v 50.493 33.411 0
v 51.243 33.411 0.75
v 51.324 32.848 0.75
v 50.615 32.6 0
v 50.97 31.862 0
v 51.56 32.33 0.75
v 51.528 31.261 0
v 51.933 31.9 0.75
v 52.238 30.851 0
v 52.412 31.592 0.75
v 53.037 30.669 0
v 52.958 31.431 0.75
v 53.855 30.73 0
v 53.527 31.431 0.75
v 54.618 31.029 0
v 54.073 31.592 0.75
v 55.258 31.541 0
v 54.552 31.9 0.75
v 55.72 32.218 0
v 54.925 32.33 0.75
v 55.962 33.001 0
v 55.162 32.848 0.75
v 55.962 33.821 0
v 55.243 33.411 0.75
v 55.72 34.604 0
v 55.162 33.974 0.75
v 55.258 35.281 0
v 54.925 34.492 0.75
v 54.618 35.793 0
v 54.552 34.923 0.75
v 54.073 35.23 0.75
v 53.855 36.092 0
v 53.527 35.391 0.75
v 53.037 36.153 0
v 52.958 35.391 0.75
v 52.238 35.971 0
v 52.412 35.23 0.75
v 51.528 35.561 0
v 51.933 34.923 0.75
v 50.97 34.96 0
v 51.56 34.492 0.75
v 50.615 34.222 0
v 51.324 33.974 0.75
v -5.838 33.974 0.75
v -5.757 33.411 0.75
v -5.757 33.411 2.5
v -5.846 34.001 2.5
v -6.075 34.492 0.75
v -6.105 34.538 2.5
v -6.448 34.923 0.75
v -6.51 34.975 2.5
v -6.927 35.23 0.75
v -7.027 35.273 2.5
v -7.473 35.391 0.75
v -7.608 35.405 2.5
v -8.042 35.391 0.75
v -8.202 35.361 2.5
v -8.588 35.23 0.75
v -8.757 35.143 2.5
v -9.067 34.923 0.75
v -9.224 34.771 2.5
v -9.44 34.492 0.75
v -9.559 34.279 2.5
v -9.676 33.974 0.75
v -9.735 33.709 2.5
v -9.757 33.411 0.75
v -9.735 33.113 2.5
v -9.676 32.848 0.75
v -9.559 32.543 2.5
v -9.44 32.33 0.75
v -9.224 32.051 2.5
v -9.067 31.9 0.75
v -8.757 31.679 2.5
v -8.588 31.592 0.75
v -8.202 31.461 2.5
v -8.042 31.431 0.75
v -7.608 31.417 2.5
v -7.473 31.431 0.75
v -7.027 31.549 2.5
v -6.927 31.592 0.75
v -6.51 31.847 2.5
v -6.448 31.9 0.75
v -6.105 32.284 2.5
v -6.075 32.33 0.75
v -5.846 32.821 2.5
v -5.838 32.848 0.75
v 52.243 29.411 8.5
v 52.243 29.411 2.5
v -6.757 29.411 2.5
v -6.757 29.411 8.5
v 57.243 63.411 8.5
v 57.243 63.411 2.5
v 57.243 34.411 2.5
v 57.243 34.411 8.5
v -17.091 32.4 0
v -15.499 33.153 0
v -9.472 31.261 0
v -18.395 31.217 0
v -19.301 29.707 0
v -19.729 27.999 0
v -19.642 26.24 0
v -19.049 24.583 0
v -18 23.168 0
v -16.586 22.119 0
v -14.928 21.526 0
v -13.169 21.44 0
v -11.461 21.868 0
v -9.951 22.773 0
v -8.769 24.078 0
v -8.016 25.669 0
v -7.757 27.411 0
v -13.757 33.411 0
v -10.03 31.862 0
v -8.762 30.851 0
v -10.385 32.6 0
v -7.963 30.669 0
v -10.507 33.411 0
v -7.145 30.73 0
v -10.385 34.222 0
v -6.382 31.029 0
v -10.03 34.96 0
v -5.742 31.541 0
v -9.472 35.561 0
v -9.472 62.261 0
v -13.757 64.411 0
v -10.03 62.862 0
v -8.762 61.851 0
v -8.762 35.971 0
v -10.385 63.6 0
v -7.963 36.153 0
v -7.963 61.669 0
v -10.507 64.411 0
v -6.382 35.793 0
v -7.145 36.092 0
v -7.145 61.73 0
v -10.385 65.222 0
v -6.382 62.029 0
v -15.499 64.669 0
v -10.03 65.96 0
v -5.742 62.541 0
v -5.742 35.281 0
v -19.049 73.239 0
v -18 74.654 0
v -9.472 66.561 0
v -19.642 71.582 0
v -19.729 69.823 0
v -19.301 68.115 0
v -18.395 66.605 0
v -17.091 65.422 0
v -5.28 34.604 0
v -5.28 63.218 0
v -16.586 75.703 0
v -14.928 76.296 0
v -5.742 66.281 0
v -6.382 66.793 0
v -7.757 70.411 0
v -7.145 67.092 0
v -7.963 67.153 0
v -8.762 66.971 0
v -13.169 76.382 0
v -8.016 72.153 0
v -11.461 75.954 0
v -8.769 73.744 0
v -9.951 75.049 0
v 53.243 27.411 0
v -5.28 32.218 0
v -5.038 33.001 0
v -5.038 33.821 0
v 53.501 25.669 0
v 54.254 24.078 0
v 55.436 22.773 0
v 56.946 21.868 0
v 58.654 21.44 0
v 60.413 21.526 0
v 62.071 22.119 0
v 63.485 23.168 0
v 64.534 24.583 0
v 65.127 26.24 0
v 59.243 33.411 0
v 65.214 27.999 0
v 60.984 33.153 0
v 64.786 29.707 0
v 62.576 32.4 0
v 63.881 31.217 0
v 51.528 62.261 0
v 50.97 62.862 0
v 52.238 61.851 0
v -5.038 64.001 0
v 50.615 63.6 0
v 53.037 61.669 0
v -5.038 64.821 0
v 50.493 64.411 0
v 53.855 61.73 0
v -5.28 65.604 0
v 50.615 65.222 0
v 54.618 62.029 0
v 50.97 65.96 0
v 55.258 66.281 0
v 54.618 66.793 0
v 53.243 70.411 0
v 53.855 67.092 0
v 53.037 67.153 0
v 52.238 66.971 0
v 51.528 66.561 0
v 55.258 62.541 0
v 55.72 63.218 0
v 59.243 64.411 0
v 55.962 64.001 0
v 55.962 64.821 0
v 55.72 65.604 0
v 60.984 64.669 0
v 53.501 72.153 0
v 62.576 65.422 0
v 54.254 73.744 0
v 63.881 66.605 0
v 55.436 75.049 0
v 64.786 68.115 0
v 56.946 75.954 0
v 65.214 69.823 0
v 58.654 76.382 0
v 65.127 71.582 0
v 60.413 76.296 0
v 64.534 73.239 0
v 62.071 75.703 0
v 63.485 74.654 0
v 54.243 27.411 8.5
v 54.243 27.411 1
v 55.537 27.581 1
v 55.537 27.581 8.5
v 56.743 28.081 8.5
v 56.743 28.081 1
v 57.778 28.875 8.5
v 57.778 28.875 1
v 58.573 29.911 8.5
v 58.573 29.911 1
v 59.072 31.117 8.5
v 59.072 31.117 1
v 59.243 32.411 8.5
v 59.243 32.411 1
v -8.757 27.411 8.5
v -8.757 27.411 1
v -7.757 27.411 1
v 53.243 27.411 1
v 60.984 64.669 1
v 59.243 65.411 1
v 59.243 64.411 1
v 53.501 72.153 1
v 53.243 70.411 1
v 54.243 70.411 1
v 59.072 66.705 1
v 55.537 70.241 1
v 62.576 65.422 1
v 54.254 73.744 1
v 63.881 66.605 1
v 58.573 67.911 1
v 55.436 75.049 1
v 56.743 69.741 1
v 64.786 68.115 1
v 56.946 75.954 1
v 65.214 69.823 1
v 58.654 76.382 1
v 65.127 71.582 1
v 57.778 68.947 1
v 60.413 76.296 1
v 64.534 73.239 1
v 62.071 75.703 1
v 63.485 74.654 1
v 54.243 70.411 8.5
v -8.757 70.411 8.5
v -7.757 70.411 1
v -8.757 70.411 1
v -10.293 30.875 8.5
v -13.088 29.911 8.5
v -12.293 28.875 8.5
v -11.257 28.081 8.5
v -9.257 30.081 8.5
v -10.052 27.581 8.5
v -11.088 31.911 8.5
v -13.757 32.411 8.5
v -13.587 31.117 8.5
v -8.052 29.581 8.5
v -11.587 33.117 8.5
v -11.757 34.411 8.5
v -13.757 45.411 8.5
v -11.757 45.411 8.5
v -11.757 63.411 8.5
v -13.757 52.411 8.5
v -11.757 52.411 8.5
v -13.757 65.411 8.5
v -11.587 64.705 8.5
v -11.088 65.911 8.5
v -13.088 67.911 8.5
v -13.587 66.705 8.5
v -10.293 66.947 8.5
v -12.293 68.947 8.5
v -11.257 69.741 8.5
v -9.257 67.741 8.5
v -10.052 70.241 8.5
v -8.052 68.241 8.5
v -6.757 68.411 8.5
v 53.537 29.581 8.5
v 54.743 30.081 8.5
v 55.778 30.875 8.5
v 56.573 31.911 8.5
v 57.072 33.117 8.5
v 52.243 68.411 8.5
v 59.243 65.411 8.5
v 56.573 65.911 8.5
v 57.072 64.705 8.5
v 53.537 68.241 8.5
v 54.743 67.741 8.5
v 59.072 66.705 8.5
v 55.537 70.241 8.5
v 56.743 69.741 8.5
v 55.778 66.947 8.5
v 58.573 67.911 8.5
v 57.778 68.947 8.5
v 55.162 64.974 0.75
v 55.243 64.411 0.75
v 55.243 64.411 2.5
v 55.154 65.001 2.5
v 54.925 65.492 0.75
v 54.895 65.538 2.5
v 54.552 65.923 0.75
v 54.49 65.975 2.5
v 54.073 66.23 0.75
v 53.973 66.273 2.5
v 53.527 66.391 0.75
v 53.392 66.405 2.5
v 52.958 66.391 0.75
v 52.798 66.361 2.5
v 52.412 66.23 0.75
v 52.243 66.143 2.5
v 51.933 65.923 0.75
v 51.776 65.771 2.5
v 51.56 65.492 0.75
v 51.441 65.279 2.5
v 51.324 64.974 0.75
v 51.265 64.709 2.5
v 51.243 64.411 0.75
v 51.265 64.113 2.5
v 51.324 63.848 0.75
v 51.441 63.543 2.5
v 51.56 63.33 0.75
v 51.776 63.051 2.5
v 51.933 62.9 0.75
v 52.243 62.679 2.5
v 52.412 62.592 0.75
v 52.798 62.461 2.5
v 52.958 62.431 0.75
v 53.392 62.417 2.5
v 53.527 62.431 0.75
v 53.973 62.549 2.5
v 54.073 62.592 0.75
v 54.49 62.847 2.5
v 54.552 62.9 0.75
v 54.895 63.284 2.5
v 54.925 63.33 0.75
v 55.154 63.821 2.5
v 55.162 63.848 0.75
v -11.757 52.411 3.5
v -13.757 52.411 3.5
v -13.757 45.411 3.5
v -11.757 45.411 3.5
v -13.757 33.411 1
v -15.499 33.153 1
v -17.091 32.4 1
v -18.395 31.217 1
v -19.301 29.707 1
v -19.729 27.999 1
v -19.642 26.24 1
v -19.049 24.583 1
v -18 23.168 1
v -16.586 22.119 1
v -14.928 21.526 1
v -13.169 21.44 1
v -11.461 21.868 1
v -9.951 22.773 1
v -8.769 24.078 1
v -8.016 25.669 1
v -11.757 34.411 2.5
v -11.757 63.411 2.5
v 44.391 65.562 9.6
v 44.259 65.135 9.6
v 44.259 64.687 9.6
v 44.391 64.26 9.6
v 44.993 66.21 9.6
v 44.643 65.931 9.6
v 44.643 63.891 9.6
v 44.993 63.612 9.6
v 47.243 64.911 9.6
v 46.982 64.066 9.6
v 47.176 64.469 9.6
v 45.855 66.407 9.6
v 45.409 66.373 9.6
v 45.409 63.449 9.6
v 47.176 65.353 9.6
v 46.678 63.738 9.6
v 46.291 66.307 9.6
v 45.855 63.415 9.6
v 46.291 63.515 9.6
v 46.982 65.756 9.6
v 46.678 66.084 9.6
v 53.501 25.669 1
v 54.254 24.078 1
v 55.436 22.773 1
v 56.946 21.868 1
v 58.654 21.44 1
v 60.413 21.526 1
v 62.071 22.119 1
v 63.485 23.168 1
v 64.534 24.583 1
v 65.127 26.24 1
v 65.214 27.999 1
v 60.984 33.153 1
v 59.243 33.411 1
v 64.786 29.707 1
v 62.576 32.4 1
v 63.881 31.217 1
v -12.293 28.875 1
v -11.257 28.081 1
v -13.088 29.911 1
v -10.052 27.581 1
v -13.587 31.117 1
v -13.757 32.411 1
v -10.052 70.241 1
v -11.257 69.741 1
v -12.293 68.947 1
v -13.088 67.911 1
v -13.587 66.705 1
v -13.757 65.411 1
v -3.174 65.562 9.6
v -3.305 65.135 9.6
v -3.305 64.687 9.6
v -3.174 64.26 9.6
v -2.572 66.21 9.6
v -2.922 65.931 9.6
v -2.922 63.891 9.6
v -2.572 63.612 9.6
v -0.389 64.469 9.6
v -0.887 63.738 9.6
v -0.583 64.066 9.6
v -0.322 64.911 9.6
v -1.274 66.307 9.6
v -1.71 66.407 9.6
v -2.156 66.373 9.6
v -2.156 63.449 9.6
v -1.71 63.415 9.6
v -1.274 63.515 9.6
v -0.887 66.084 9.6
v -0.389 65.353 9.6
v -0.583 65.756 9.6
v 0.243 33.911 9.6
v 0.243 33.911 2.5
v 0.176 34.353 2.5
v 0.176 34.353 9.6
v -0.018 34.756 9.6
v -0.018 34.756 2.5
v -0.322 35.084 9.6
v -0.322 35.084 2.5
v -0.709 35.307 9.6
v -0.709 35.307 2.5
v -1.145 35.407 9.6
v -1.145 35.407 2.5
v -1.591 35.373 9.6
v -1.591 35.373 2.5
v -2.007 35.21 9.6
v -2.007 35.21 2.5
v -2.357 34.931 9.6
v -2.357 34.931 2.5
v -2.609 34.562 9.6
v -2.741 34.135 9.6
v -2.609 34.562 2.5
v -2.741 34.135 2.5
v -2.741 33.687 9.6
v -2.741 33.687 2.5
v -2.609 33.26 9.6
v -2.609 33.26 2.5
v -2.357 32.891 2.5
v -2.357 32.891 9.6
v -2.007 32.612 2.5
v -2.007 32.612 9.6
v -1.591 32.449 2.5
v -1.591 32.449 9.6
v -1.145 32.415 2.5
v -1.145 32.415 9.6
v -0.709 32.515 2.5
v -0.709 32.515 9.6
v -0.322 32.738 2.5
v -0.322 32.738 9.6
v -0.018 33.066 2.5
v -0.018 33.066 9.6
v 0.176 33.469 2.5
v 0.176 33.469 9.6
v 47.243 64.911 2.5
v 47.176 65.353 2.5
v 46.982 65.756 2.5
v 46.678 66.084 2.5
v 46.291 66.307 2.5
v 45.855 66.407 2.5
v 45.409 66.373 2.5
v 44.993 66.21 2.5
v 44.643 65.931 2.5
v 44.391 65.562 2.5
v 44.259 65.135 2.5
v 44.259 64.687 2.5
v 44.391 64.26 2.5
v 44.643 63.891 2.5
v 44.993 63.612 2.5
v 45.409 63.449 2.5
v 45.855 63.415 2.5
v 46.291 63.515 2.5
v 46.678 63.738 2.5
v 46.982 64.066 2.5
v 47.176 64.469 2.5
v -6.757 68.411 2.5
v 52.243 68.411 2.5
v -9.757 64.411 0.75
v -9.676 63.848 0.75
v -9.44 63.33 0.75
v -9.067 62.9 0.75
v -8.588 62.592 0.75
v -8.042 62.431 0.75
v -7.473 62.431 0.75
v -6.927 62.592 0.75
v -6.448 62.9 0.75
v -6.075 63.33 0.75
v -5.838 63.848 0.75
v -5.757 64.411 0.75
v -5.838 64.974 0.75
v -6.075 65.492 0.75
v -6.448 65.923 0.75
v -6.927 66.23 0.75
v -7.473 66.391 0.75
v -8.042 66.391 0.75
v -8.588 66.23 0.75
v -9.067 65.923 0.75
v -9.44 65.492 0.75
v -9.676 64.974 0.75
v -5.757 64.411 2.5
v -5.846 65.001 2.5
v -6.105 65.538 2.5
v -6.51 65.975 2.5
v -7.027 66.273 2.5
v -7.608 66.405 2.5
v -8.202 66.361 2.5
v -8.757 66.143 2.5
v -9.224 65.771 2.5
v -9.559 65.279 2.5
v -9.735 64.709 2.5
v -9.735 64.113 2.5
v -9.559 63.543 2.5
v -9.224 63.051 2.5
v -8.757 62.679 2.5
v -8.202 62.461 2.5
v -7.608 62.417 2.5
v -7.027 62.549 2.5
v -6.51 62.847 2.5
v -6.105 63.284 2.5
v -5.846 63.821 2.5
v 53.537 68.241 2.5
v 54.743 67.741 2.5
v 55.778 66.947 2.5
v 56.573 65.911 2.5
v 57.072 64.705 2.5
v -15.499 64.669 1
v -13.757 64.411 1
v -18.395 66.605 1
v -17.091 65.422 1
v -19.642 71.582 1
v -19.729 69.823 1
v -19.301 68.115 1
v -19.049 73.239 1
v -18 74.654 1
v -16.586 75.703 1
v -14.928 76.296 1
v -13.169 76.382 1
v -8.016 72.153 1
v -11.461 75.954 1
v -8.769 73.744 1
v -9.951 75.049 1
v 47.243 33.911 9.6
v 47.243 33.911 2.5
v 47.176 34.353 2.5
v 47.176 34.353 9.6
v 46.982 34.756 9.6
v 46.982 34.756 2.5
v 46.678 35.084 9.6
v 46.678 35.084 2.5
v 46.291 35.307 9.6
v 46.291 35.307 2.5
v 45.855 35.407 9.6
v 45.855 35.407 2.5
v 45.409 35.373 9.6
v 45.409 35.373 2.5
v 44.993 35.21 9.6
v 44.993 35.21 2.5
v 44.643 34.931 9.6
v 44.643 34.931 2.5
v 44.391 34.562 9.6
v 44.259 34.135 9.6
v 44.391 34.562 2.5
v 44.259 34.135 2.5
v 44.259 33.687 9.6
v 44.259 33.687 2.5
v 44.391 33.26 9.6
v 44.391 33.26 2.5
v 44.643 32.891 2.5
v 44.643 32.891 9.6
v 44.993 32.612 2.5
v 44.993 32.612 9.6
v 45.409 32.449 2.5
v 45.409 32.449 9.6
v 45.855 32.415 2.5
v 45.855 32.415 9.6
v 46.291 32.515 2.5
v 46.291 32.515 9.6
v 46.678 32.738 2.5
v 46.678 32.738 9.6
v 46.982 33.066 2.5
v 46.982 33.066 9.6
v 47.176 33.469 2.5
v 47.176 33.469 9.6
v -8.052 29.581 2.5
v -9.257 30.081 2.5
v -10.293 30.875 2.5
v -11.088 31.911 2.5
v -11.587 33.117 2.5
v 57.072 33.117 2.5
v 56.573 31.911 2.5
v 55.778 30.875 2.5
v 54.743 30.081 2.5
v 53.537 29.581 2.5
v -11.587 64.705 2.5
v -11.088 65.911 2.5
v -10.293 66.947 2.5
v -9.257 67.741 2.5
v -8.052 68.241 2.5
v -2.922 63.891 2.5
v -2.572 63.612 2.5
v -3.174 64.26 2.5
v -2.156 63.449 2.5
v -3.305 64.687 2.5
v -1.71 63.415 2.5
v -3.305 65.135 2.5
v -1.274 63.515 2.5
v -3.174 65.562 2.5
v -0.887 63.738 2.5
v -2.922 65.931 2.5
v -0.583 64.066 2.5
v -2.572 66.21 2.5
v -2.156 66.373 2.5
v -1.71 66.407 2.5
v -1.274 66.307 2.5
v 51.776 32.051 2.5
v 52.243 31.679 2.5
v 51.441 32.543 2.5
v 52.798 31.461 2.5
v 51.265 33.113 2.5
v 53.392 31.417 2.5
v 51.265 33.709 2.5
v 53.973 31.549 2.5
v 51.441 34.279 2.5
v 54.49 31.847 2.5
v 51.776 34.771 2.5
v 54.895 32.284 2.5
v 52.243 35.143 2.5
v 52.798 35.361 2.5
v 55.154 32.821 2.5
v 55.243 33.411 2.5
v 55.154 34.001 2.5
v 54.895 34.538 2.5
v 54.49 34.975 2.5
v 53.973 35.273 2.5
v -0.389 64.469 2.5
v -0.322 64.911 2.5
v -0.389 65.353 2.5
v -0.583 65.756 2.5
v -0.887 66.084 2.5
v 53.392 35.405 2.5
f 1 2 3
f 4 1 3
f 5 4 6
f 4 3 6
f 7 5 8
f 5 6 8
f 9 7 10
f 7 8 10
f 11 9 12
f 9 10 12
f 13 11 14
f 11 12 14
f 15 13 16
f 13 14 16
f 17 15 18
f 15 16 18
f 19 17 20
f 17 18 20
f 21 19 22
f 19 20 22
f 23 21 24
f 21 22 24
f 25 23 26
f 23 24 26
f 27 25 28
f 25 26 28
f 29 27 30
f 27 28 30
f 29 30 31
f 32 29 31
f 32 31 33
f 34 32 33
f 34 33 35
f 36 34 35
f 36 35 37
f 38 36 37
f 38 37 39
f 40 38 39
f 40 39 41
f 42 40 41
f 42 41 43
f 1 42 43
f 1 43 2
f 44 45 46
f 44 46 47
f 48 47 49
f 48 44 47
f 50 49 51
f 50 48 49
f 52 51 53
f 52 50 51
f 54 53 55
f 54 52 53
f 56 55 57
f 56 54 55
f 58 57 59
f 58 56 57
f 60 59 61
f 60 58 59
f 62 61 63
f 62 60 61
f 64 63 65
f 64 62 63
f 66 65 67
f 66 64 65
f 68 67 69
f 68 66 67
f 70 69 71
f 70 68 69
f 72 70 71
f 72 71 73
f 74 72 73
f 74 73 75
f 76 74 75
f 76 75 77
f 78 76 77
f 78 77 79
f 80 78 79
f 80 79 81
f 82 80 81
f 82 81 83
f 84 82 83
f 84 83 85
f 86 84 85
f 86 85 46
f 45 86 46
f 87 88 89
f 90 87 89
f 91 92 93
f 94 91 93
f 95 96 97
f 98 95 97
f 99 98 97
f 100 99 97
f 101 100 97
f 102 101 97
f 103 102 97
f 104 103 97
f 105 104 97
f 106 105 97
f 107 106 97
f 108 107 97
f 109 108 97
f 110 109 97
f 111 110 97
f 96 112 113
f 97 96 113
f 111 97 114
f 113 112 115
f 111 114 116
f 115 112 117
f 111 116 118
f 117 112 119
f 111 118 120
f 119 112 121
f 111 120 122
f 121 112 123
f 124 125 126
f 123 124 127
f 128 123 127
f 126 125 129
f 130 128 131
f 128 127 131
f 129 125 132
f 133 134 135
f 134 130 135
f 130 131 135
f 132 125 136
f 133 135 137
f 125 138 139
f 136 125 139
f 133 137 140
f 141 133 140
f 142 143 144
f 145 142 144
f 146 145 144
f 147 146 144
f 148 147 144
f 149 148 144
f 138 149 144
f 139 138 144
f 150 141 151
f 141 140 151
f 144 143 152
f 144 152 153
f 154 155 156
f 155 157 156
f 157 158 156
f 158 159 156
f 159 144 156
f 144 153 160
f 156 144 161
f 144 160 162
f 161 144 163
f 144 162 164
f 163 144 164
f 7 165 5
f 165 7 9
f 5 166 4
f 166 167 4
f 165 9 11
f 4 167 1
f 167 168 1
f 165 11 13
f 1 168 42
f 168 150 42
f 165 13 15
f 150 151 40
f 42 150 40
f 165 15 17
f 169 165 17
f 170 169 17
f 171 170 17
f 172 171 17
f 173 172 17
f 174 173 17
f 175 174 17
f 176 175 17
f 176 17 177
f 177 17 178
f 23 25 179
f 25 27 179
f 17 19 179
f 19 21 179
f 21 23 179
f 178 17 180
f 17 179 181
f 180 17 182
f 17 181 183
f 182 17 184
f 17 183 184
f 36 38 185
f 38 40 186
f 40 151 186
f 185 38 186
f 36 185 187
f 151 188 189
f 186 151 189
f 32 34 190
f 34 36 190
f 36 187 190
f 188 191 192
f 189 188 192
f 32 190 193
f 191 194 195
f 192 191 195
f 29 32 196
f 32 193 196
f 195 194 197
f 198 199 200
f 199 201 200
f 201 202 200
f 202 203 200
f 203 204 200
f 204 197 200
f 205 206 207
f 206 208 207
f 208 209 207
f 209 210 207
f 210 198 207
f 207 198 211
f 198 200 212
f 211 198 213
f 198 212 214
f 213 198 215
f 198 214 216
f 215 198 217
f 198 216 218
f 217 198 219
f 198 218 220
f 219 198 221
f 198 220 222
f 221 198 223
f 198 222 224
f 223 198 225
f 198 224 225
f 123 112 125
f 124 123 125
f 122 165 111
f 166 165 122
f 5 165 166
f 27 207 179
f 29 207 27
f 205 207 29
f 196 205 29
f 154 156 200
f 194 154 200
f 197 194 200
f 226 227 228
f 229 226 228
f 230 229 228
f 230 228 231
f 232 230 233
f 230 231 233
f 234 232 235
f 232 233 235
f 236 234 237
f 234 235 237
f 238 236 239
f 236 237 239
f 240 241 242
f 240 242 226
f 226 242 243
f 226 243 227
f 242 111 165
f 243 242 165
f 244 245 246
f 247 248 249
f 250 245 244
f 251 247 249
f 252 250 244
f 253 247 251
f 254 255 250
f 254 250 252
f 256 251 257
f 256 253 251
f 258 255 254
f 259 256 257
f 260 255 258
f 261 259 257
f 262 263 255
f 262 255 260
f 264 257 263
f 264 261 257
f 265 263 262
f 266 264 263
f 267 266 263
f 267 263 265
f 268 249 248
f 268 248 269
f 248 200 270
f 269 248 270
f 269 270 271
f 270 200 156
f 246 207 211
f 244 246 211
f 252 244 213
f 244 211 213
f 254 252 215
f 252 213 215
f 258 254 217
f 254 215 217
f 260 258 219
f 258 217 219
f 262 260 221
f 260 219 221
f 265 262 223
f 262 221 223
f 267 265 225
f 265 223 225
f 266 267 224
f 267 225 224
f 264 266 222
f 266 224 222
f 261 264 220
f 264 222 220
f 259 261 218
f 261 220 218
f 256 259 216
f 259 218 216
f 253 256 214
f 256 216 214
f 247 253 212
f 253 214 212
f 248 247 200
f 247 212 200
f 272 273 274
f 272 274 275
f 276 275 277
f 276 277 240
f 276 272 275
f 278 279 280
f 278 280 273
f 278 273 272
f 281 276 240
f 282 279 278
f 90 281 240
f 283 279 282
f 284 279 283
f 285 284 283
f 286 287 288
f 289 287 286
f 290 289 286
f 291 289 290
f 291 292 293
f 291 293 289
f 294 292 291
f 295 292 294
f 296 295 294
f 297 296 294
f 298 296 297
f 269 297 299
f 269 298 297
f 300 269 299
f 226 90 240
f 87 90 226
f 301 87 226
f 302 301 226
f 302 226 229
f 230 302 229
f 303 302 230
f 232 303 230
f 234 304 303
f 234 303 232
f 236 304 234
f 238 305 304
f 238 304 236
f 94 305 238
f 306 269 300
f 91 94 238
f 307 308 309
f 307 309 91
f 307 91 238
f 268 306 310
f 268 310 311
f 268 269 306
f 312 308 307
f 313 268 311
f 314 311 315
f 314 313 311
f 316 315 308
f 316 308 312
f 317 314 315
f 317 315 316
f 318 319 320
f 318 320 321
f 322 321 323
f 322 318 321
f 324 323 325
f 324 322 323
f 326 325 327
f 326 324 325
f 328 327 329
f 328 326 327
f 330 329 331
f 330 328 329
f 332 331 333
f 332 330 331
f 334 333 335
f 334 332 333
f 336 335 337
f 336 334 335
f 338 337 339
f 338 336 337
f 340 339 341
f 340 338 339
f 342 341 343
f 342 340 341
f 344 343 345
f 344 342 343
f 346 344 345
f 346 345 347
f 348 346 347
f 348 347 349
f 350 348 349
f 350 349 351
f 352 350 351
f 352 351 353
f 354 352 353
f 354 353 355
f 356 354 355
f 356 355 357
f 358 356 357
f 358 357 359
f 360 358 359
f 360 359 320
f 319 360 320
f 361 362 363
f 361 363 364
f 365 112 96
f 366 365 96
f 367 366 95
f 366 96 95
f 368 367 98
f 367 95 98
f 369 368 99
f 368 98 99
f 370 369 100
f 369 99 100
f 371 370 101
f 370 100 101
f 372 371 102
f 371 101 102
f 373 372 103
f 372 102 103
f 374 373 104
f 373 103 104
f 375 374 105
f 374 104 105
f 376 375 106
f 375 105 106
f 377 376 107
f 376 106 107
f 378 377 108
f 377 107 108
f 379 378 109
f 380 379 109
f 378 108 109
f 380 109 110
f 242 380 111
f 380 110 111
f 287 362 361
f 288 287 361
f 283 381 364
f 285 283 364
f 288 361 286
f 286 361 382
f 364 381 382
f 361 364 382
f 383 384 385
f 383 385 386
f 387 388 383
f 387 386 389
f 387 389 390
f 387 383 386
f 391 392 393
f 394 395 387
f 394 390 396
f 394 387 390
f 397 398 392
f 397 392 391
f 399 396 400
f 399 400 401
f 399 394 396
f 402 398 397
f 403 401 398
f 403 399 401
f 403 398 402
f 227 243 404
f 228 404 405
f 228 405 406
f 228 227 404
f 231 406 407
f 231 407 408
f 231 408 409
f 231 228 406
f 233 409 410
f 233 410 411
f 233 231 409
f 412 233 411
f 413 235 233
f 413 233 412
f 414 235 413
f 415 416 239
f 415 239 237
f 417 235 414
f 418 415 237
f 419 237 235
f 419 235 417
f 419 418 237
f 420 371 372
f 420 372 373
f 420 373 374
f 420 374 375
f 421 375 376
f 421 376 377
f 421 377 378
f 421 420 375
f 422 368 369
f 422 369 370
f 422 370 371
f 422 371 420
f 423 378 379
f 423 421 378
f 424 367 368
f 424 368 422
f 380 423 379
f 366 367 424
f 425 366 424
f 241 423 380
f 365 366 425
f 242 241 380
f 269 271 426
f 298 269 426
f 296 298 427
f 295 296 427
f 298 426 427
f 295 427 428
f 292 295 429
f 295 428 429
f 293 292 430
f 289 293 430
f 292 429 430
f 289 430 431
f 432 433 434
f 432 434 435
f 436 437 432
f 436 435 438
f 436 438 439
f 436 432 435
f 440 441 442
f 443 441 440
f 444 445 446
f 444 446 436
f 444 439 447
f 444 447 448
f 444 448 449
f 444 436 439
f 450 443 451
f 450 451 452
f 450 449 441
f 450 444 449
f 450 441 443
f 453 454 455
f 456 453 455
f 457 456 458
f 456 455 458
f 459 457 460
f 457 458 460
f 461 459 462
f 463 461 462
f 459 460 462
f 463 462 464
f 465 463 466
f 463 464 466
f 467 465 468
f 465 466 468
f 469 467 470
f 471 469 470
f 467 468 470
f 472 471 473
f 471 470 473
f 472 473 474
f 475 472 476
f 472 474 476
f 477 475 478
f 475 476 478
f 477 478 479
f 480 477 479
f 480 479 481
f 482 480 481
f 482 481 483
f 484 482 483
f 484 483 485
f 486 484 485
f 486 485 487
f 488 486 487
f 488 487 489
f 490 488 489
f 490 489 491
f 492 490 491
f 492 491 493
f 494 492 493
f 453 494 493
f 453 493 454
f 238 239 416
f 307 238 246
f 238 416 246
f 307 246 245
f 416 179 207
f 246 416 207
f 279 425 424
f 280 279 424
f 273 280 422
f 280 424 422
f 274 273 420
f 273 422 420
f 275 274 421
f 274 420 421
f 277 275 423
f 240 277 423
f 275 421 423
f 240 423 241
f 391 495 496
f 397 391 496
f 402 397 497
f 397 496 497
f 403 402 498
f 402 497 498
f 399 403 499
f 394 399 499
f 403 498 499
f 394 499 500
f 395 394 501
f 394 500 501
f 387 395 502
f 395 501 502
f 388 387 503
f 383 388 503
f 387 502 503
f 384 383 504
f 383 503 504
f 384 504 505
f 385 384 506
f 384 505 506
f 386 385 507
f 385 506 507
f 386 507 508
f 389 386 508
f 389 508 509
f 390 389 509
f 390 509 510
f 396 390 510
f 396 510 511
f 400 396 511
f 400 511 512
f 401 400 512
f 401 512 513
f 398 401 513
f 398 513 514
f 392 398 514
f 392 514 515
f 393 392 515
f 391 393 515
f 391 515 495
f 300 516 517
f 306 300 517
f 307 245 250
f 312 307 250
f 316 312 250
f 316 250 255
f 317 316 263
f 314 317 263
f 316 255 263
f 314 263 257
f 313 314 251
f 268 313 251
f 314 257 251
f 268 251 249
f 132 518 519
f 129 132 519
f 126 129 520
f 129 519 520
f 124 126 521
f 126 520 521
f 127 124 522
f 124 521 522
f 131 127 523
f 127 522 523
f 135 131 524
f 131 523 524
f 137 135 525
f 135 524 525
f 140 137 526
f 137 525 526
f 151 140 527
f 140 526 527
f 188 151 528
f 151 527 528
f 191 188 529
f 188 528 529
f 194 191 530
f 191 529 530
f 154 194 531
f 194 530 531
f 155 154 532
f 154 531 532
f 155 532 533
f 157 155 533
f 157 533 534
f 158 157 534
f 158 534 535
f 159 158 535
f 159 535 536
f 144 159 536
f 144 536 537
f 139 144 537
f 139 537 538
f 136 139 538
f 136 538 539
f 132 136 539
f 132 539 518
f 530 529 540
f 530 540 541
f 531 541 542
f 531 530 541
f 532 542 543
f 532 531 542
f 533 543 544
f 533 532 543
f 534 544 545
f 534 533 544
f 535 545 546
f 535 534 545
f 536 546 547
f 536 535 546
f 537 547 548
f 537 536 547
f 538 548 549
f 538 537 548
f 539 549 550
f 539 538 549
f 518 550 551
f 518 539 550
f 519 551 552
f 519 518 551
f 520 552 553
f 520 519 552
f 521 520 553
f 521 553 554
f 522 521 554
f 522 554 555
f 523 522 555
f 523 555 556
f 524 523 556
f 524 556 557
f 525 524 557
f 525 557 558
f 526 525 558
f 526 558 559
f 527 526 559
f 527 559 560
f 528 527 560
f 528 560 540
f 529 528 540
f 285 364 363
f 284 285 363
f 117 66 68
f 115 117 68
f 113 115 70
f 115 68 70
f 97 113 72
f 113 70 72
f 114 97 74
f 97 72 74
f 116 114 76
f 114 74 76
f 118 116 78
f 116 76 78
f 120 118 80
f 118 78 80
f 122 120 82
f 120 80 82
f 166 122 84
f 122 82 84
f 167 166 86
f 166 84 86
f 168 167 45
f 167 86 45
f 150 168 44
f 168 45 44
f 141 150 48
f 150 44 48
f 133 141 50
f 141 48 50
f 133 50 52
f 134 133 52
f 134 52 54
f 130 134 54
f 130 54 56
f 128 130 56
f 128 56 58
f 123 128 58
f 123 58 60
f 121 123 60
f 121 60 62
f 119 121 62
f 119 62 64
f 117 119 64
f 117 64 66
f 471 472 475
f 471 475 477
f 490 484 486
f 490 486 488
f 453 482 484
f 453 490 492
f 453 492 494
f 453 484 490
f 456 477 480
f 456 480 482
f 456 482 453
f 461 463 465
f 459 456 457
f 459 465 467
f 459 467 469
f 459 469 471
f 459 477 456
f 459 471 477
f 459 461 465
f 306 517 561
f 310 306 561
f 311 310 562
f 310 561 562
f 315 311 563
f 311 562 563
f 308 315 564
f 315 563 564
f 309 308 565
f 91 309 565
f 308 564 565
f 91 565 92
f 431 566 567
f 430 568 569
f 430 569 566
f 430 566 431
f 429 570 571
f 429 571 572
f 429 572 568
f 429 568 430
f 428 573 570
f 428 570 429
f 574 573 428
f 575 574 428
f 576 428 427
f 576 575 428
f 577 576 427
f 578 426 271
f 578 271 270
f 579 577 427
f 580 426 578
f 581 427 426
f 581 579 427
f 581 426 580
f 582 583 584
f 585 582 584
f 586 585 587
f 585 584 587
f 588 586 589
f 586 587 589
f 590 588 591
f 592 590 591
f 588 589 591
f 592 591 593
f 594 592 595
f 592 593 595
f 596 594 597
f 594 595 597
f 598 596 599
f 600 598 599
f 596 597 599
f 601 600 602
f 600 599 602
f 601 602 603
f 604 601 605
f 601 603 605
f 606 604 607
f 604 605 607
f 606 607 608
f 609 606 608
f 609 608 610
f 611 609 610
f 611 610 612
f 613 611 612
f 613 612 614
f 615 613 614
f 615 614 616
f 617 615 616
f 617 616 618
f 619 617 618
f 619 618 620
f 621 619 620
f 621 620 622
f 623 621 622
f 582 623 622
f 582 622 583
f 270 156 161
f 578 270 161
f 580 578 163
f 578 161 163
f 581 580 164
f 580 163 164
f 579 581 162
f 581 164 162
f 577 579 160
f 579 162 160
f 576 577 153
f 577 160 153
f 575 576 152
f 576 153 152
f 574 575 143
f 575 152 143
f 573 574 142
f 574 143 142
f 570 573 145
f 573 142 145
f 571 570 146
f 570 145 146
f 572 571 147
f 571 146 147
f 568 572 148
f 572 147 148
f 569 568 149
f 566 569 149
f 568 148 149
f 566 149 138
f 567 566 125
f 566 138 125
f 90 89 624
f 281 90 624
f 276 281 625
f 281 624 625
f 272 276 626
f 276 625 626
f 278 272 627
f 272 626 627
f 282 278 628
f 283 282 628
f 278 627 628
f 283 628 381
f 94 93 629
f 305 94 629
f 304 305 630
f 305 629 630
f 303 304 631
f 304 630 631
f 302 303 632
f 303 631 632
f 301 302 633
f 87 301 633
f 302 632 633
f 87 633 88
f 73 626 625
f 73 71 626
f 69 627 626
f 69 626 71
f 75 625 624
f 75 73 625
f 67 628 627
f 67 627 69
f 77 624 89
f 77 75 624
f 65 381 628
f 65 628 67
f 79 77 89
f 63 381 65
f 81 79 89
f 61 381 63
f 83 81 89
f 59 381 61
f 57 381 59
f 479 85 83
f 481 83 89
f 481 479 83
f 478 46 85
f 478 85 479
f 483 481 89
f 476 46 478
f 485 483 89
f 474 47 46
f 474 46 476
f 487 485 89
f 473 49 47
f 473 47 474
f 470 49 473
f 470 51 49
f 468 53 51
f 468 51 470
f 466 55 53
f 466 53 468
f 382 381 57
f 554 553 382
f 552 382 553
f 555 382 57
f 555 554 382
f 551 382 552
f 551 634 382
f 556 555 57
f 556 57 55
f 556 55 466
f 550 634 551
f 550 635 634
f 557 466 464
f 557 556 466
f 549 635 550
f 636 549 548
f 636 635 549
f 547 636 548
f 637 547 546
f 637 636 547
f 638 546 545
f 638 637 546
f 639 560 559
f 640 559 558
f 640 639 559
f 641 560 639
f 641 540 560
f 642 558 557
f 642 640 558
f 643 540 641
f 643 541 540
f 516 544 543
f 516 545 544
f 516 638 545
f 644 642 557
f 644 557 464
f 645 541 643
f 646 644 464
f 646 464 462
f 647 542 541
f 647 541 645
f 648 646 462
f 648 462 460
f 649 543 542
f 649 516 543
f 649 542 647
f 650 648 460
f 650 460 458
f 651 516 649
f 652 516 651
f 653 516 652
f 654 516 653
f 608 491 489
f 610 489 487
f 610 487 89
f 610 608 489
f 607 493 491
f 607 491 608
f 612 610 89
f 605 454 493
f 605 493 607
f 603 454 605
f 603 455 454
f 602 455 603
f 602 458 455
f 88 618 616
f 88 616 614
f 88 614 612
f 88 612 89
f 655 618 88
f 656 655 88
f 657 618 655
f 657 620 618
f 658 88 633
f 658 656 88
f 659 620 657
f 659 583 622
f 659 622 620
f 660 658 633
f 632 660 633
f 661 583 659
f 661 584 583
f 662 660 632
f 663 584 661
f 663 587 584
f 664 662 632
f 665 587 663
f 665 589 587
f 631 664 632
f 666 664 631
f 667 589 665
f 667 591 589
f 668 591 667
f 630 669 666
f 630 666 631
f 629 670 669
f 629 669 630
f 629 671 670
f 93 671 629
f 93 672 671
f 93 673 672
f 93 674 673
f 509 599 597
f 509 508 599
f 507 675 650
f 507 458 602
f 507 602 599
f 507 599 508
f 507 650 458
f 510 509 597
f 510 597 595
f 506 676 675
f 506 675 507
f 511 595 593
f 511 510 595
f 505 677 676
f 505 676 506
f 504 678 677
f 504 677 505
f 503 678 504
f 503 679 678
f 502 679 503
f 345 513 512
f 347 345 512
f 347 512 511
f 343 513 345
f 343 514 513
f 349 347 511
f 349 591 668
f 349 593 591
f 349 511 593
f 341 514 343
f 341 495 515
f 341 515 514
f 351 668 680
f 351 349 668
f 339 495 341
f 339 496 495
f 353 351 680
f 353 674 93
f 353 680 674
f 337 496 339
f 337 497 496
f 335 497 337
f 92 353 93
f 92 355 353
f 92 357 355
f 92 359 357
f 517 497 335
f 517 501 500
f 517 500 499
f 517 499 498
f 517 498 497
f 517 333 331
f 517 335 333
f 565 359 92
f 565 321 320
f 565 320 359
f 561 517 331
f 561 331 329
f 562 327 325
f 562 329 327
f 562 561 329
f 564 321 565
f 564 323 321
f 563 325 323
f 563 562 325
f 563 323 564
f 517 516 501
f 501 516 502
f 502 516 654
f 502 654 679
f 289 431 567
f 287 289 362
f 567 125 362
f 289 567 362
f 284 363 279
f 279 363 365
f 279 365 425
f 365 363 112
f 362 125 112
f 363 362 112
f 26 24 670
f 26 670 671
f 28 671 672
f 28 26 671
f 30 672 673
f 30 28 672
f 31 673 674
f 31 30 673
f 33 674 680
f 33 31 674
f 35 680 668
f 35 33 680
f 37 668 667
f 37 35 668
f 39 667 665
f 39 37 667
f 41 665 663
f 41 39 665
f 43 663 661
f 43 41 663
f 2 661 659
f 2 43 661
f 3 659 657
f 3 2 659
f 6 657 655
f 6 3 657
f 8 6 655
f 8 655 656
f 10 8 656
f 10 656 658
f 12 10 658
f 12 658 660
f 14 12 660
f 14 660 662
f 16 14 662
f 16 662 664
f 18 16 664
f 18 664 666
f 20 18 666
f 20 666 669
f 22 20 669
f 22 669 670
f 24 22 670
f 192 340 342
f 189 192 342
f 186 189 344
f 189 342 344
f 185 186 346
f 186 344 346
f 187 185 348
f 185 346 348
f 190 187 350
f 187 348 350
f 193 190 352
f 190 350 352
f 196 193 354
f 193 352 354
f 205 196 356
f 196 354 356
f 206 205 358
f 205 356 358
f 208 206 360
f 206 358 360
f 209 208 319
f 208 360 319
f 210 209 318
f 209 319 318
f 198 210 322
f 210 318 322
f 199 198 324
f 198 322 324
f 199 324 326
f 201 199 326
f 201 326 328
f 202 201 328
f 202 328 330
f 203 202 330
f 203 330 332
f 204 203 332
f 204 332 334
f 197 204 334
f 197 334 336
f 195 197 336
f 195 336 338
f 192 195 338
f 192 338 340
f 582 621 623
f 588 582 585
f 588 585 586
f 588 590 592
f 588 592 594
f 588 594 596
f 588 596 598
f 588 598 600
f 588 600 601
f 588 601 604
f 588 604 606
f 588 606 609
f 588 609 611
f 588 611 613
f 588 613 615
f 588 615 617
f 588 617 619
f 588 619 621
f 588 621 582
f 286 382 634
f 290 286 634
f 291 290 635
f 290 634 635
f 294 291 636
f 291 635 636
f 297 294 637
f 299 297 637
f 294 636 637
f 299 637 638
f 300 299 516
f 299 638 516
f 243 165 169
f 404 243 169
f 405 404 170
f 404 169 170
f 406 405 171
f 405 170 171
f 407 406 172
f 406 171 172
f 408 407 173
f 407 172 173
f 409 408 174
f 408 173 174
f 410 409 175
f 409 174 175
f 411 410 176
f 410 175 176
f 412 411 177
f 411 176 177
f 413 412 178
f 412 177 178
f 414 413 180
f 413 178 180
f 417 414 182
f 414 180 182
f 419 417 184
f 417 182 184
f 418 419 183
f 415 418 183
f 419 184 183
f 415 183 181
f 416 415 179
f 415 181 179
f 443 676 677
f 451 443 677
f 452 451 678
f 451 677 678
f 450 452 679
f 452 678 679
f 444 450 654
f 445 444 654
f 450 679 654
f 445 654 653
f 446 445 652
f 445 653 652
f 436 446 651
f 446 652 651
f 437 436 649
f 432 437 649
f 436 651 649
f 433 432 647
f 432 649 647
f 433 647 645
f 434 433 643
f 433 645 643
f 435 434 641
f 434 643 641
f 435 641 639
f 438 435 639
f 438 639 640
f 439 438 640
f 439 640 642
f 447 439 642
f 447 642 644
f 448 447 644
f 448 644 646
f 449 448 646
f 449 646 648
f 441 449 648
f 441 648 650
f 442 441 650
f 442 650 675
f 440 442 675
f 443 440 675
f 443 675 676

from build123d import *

# Parameters (mm, degrees)
F0_R           = 2
F0_R_2         = 1.5
F0_W           = 2
F0_H           = 7
F1_DEPTH       = 2.5
F2_DEPTH       = 8.5
F3_DEPTH       = 9.6
F4_DEPTH       = 3.5
F5_D           = 3
F5_CSINK_D     = 5.5
F5_CSINK_ANGLE = 90
F6_DEPTH       = 1


with BuildPart() as f1:
    # F0 (on Top) → F1 (new body)
    with BuildSketch(Plane.XY):
        with BuildLine():
            Line((52.2425711751, 68.4110085815), (-6.7574288249, 68.4110085815))
            ThreePointArc((-6.7574288249, 68.4110085815), (-10.2929627308, 66.9465424875), (-11.7574288249, 63.4110085815))
            Line((-11.7574288249, 63.4110085815), (-11.7574288249, 52.4110085815))
            Line((-11.7574288249, 52.4110085815), (-11.7574288249, 45.4110085815))
            Line((-11.7574288249, 45.4110085815), (-11.7574288249, 34.4110085815))
            ThreePointArc((-11.7574288249, 34.4110085815), (-10.2929627308, 30.8754746756), (-6.7574288249, 29.4110085815))
            Line((-6.7574288249, 29.4110085815), (52.2425711751, 29.4110085815))
            ThreePointArc((52.2425711751, 29.4110085815), (55.778105081, 30.8754746756), (57.2425711751, 34.4110085815))
            Line((57.2425711751, 34.4110085815), (57.2425711751, 63.4110085815))
            ThreePointArc((57.2425711751, 63.4110085815), (55.778105081, 66.9465424875), (52.2425711751, 68.4110085815))
        make_face()
        with Locations((-7.7574288249, 33.4110085815)):
            Circle(F0_R, mode=Mode.SUBTRACT)
        with Locations((-1.2574288249, 33.9110085815)):
            Circle(F0_R_2, mode=Mode.SUBTRACT)
        with Locations((45.7425711751, 33.9110085815)):
            Circle(F0_R_2, mode=Mode.SUBTRACT)
        with Locations((53.2425711751, 33.4110085815)):
            Circle(F0_R, mode=Mode.SUBTRACT)
        with Locations((-7.7574288249, 64.4110085815)):
            Circle(F0_R, mode=Mode.SUBTRACT)
        with Locations((-1.8220887287, 64.9110085815)):
            Circle(F0_R_2, mode=Mode.SUBTRACT)
        with Locations((45.7425711751, 64.9110085815)):
            Circle(F0_R_2, mode=Mode.SUBTRACT)
        with Locations((53.2425711751, 64.4110085815)):
            Circle(F0_R, mode=Mode.SUBTRACT)
        with BuildLine():
            ThreePointArc((-11.7574288249, 63.4110085815), (-10.2929627308, 66.9465424875), (-6.7574288249, 68.4110085815))
            Line((-6.7574288249, 68.4110085815), (52.2425711751, 68.4110085815))
            ThreePointArc((52.2425711751, 68.4110085815), (55.778105081, 66.9465424875), (57.2425711751, 63.4110085815))
            Line((57.2425711751, 63.4110085815), (57.2425711751, 34.4110085815))
            ThreePointArc((57.2425711751, 34.4110085815), (55.778105081, 30.8754746756), (52.2425711751, 29.4110085815))
            Line((52.2425711751, 29.4110085815), (-6.7574288249, 29.4110085815))
            ThreePointArc((-6.7574288249, 29.4110085815), (-10.2929627308, 30.8754746756), (-11.7574288249, 34.4110085815))
            Line((-11.7574288249, 34.4110085815), (-11.7574288249, 45.4110085815))
            Line((-11.7574288249, 45.4110085815), (-13.7574288249, 45.4110085815))
            Line((-13.7574288249, 45.4110085815), (-13.7574288249, 33.4110085815))
            Line((-13.7574288249, 33.4110085815), (-13.7574288249, 32.4110085815))
            ThreePointArc((-13.7574288249, 32.4110085815), (-12.2929627308, 28.8754746756), (-8.7574288249, 27.4110085815))
            Line((-8.7574288249, 27.4110085815), (-7.7574288249, 27.4110085815))
            Line((-7.7574288249, 27.4110085815), (53.2425711751, 27.4110085815))
            Line((53.2425711751, 27.4110085815), (54.2425711751, 27.4110085815))
            ThreePointArc((54.2425711751, 27.4110085815), (57.778105081, 28.8754746756), (59.2425711751, 32.4110085815))
            Line((59.2425711751, 32.4110085815), (59.2425711751, 33.4110085815))
            Line((59.2425711751, 33.4110085815), (59.2425711751, 64.4110085815))
            Line((59.2425711751, 64.4110085815), (59.2425711751, 65.4110085815))
            ThreePointArc((59.2425711751, 65.4110085815), (57.778105081, 68.9465424875), (54.2425711751, 70.4110085815))
            Line((54.2425711751, 70.4110085815), (53.2425711751, 70.4110085815))
            Line((53.2425711751, 70.4110085815), (-7.7574288249, 70.4110085815))
            Line((-7.7574288249, 70.4110085815), (-8.7574288249, 70.4110085815))
            ThreePointArc((-8.7574288249, 70.4110085815), (-12.2929627308, 68.9465424875), (-13.7574288249, 65.4110085815))
            Line((-13.7574288249, 65.4110085815), (-13.7574288249, 64.4110085815))
            Line((-13.7574288249, 64.4110085815), (-13.7574288249, 52.4110085815))
            Line((-13.7574288249, 52.4110085815), (-11.7574288249, 52.4110085815))
            Line((-11.7574288249, 52.4110085815), (-11.7574288249, 63.4110085815))
        make_face()
        with Locations((-1.2574288249, 33.9110085815)):
            Circle(F0_R_2)
        with Locations((45.7425711751, 33.9110085815)):
            Circle(F0_R_2)
        with Locations((45.7425711751, 64.9110085815)):
            Circle(F0_R_2)
        with Locations((-1.8220887287, 64.9110085815)):
            Circle(F0_R_2)
        with Locations((-12.7574288249, 48.9110085815)):
            Rectangle(F0_W, F0_H)
    extrude(amount=F1_DEPTH)

    # F0 (on Top) → F2 (join)
    with BuildSketch(Plane.XY):
        with BuildLine():
            ThreePointArc((-11.7574288249, 63.4110085815), (-10.2929627308, 66.9465424875), (-6.7574288249, 68.4110085815))
            Line((-6.7574288249, 68.4110085815), (52.2425711751, 68.4110085815))
            ThreePointArc((52.2425711751, 68.4110085815), (55.778105081, 66.9465424875), (57.2425711751, 63.4110085815))
            Line((57.2425711751, 63.4110085815), (57.2425711751, 34.4110085815))
            ThreePointArc((57.2425711751, 34.4110085815), (55.778105081, 30.8754746756), (52.2425711751, 29.4110085815))
            Line((52.2425711751, 29.4110085815), (-6.7574288249, 29.4110085815))
            ThreePointArc((-6.7574288249, 29.4110085815), (-10.2929627308, 30.8754746756), (-11.7574288249, 34.4110085815))
            Line((-11.7574288249, 34.4110085815), (-11.7574288249, 45.4110085815))
            Line((-11.7574288249, 45.4110085815), (-13.7574288249, 45.4110085815))
            Line((-13.7574288249, 45.4110085815), (-13.7574288249, 33.4110085815))
            Line((-13.7574288249, 33.4110085815), (-13.7574288249, 32.4110085815))
            ThreePointArc((-13.7574288249, 32.4110085815), (-12.2929627308, 28.8754746756), (-8.7574288249, 27.4110085815))
            Line((-8.7574288249, 27.4110085815), (-7.7574288249, 27.4110085815))
            Line((-7.7574288249, 27.4110085815), (53.2425711751, 27.4110085815))
            Line((53.2425711751, 27.4110085815), (54.2425711751, 27.4110085815))
            ThreePointArc((54.2425711751, 27.4110085815), (57.778105081, 28.8754746756), (59.2425711751, 32.4110085815))
            Line((59.2425711751, 32.4110085815), (59.2425711751, 33.4110085815))
            Line((59.2425711751, 33.4110085815), (59.2425711751, 64.4110085815))
            Line((59.2425711751, 64.4110085815), (59.2425711751, 65.4110085815))
            ThreePointArc((59.2425711751, 65.4110085815), (57.778105081, 68.9465424875), (54.2425711751, 70.4110085815))
            Line((54.2425711751, 70.4110085815), (53.2425711751, 70.4110085815))
            Line((53.2425711751, 70.4110085815), (-7.7574288249, 70.4110085815))
            Line((-7.7574288249, 70.4110085815), (-8.7574288249, 70.4110085815))
            ThreePointArc((-8.7574288249, 70.4110085815), (-12.2929627308, 68.9465424875), (-13.7574288249, 65.4110085815))
            Line((-13.7574288249, 65.4110085815), (-13.7574288249, 64.4110085815))
            Line((-13.7574288249, 64.4110085815), (-13.7574288249, 52.4110085815))
            Line((-13.7574288249, 52.4110085815), (-11.7574288249, 52.4110085815))
            Line((-11.7574288249, 52.4110085815), (-11.7574288249, 63.4110085815))
        make_face()
    extrude(amount=F2_DEPTH)

    # F0 (on Top) → F3 (join)
    with BuildSketch(Plane.XY):
        with Locations((-1.8220887287, 64.9110085815)):
            Circle(F0_R_2)
        with Locations((-1.2574288249, 33.9110085815)):
            Circle(F0_R_2)
        with Locations((45.7425711751, 33.9110085815)):
            Circle(F0_R_2)
        with Locations((45.7425711751, 64.9110085815)):
            Circle(F0_R_2)
    extrude(amount=F3_DEPTH)

    # F0 (on Top) → F4 (join)
    with BuildSketch(Plane.XY):
        with Locations((-12.7574288249, 48.9110085815)):
            Rectangle(F0_W, F0_H)
    extrude(amount=F4_DEPTH)

    # F5 (through all)
    with Locations(Plane(origin=(0, 0, 0), x_dir=(1, 0, 0), z_dir=(0, 0, -1))):
        with Locations((53.2425711751, -64.4110085815), (53.2425711751, -33.4110085815), (-7.7574288249, -33.4110085815), (-7.7574288249, -64.4110085815)):
            CounterSinkHole(F5_D / 2, F5_CSINK_D / 2, counter_sink_angle=F5_CSINK_ANGLE)

    # F0 (on Top) → F6 (join)
    with BuildSketch(Plane.XY):
        with BuildLine():
            ThreePointArc((-7.7574288249, 70.4110085815), (-18.000069512, 74.6536492686), (-13.7574288249, 64.4110085815))
            Line((-13.7574288249, 64.4110085815), (-13.7574288249, 65.4110085815))
            ThreePointArc((-13.7574288249, 65.4110085815), (-12.2929627308, 68.9465424875), (-8.7574288249, 70.4110085815))
            Line((-8.7574288249, 70.4110085815), (-7.7574288249, 70.4110085815))
        make_face()
        with BuildLine():
            ThreePointArc((59.2425711751, 64.4110085815), (63.4852118622, 74.6536492686), (53.2425711751, 70.4110085815))
            Line((53.2425711751, 70.4110085815), (54.2425711751, 70.4110085815))
            ThreePointArc((54.2425711751, 70.4110085815), (57.778105081, 68.9465424875), (59.2425711751, 65.4110085815))
            Line((59.2425711751, 65.4110085815), (59.2425711751, 64.4110085815))
        make_face()
        with BuildLine():
            Line((54.2425711751, 27.4110085815), (53.2425711751, 27.4110085815))
            ThreePointArc((53.2425711751, 27.4110085815), (63.4852118622, 23.1683678944), (59.2425711751, 33.4110085815))
            Line((59.2425711751, 33.4110085815), (59.2425711751, 32.4110085815))
            ThreePointArc((59.2425711751, 32.4110085815), (57.778105081, 28.8754746756), (54.2425711751, 27.4110085815))
        make_face()
        with BuildLine():
            Line((-13.7574288249, 32.4110085815), (-13.7574288249, 33.4110085815))
            ThreePointArc((-13.7574288249, 33.4110085815), (-18.000069512, 23.1683678944), (-7.7574288249, 27.4110085815))
            Line((-7.7574288249, 27.4110085815), (-8.7574288249, 27.4110085815))
            ThreePointArc((-8.7574288249, 27.4110085815), (-12.2929627308, 28.8754746756), (-13.7574288249, 32.4110085815))
        make_face()
    extrude(amount=F6_DEPTH)


solid = f1.part
